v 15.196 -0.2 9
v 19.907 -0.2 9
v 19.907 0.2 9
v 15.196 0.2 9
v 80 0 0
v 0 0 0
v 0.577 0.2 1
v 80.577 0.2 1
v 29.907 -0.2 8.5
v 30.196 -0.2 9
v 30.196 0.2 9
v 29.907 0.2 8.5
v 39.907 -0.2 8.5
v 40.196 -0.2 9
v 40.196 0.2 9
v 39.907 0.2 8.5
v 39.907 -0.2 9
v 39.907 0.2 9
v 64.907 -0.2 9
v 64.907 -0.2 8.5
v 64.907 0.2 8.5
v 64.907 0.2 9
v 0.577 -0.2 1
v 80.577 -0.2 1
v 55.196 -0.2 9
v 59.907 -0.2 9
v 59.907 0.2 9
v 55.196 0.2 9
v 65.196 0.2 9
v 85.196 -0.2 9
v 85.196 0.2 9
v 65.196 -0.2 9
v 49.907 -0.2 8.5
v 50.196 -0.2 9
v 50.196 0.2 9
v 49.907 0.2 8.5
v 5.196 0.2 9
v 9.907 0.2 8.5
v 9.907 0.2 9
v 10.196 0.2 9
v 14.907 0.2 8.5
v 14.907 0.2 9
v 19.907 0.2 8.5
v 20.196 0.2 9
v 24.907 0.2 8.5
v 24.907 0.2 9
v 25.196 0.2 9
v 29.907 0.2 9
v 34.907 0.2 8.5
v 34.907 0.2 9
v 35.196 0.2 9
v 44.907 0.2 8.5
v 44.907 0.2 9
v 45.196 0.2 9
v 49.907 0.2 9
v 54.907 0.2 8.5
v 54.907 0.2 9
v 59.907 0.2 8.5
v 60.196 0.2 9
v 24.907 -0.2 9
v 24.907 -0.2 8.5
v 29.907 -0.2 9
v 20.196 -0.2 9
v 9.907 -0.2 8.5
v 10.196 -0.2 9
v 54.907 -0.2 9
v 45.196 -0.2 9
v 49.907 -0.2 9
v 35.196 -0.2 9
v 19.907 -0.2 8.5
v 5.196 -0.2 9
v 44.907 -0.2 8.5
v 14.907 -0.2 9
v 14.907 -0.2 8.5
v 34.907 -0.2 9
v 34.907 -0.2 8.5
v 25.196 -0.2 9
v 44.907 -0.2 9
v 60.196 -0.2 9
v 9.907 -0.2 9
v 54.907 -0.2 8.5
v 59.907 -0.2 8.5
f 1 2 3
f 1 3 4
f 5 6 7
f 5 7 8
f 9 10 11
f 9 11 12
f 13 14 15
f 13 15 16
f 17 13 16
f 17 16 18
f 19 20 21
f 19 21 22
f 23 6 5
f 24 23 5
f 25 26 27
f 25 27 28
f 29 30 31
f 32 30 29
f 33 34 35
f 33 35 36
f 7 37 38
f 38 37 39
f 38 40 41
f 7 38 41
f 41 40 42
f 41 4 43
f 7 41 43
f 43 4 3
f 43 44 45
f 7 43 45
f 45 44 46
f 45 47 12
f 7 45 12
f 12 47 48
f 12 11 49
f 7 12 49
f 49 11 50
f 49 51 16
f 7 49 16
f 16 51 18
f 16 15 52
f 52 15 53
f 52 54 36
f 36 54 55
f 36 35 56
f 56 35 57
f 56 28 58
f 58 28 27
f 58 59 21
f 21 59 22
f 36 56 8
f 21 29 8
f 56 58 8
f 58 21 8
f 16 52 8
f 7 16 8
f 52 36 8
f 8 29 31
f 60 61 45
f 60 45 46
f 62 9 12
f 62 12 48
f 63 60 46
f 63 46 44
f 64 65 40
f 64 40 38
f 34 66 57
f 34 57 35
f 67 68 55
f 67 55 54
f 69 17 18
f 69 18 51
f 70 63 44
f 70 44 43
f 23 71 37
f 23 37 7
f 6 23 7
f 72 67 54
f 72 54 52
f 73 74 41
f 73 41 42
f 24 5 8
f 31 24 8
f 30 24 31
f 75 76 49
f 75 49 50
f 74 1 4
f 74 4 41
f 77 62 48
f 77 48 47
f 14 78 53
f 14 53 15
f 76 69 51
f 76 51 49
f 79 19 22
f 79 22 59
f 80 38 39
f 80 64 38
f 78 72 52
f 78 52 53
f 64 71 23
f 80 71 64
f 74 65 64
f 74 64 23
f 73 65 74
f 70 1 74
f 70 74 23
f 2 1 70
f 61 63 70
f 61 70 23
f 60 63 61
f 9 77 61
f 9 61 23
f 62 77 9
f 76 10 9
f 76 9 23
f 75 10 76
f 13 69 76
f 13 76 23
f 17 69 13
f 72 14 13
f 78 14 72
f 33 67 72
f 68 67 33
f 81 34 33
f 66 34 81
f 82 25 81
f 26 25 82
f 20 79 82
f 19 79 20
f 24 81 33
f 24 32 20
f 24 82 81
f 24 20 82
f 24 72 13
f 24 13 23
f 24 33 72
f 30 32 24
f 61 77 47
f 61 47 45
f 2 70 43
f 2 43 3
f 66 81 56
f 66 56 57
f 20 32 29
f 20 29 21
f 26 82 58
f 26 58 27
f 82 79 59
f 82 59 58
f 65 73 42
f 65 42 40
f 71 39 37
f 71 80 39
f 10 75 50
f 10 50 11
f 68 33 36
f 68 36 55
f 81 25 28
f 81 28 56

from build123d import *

# Parameters (mm, degrees)
F1_DEPTH   = 0.2
F2_SIZE2   = 0.2
F2_SIZE    = 1
F2_2_SIZE2 = 0.19999
F2_2_SIZE  = 0.99999


# Not quite as in the source:
# - a fillet or chamfer is up to 0.001 mm smaller than in the source, because OpenCascade refuses the exact size


with BuildPart() as f1:
    # F0 (on Front) → F1 (new body, symmetric)
    with BuildSketch(Plane.XZ):
        Polygon((5.1961524227, 9), (0, 0), (80, 0), (85.1961524227, 9), (65.1961524227, 9), (64.9074772881, 8.5), (64.9074772881, 9), (60.1961524227, 9), (59.9074772881, 8.5), (59.9074772881, 9), (55.1961524227, 9), (54.9074772881, 8.5), (54.9074772881, 9), (50.1961524227, 9), (49.9074772881, 8.5), (49.9074772881, 9), (45.1961524227, 9), (44.9074772881, 8.5), (44.9074772881, 9), (40.1961524227, 9), (39.9074772881, 8.5), (39.9074772881, 9), (35.1961524227, 9), (34.9074772881, 8.5), (34.9074772881, 9), (30.1961524227, 9), (29.9074772881, 8.5), (29.9074772881, 9), (25.1961524227, 9), (24.9074772881, 8.5), (24.9074772881, 9), (20.1961524227, 9), (19.9074772881, 8.5), (19.9074772881, 9), (15.1961524227, 9), (14.9074772881, 8.5), (14.9074772881, 9), (10.1961524227, 9), (9.9074772881, 8.5), (9.9074772881, 9), align=None)
    extrude(amount=F1_DEPTH, both=True)

    # F2
    f2_edges = [f1.edges().sort_by_distance(p)[0] for p in [
        (40, -0.2, 0),
    ]]
    f2_side = f1.faces().sort_by_distance((42.604211, -0.2, 4.494782))[0]
    chamfer(f2_edges, length=F2_SIZE, length2=F2_SIZE2, reference=f2_side)

    # F2#2 (size 1 and 0.2 in the source; OpenCascade refuses exactly that, so slightly less here)
    f2_2_edges = [f1.edges().sort_by_distance(p)[0] for p in [
        (40, 0.2, 0),
    ]]
    f2_2_side = f1.faces().sort_by_distance((42.604211, 0.2, 4.494782))[0]
    chamfer(f2_2_edges, length=F2_2_SIZE, length2=F2_2_SIZE2, reference=f2_2_side)


solid = f1.part
